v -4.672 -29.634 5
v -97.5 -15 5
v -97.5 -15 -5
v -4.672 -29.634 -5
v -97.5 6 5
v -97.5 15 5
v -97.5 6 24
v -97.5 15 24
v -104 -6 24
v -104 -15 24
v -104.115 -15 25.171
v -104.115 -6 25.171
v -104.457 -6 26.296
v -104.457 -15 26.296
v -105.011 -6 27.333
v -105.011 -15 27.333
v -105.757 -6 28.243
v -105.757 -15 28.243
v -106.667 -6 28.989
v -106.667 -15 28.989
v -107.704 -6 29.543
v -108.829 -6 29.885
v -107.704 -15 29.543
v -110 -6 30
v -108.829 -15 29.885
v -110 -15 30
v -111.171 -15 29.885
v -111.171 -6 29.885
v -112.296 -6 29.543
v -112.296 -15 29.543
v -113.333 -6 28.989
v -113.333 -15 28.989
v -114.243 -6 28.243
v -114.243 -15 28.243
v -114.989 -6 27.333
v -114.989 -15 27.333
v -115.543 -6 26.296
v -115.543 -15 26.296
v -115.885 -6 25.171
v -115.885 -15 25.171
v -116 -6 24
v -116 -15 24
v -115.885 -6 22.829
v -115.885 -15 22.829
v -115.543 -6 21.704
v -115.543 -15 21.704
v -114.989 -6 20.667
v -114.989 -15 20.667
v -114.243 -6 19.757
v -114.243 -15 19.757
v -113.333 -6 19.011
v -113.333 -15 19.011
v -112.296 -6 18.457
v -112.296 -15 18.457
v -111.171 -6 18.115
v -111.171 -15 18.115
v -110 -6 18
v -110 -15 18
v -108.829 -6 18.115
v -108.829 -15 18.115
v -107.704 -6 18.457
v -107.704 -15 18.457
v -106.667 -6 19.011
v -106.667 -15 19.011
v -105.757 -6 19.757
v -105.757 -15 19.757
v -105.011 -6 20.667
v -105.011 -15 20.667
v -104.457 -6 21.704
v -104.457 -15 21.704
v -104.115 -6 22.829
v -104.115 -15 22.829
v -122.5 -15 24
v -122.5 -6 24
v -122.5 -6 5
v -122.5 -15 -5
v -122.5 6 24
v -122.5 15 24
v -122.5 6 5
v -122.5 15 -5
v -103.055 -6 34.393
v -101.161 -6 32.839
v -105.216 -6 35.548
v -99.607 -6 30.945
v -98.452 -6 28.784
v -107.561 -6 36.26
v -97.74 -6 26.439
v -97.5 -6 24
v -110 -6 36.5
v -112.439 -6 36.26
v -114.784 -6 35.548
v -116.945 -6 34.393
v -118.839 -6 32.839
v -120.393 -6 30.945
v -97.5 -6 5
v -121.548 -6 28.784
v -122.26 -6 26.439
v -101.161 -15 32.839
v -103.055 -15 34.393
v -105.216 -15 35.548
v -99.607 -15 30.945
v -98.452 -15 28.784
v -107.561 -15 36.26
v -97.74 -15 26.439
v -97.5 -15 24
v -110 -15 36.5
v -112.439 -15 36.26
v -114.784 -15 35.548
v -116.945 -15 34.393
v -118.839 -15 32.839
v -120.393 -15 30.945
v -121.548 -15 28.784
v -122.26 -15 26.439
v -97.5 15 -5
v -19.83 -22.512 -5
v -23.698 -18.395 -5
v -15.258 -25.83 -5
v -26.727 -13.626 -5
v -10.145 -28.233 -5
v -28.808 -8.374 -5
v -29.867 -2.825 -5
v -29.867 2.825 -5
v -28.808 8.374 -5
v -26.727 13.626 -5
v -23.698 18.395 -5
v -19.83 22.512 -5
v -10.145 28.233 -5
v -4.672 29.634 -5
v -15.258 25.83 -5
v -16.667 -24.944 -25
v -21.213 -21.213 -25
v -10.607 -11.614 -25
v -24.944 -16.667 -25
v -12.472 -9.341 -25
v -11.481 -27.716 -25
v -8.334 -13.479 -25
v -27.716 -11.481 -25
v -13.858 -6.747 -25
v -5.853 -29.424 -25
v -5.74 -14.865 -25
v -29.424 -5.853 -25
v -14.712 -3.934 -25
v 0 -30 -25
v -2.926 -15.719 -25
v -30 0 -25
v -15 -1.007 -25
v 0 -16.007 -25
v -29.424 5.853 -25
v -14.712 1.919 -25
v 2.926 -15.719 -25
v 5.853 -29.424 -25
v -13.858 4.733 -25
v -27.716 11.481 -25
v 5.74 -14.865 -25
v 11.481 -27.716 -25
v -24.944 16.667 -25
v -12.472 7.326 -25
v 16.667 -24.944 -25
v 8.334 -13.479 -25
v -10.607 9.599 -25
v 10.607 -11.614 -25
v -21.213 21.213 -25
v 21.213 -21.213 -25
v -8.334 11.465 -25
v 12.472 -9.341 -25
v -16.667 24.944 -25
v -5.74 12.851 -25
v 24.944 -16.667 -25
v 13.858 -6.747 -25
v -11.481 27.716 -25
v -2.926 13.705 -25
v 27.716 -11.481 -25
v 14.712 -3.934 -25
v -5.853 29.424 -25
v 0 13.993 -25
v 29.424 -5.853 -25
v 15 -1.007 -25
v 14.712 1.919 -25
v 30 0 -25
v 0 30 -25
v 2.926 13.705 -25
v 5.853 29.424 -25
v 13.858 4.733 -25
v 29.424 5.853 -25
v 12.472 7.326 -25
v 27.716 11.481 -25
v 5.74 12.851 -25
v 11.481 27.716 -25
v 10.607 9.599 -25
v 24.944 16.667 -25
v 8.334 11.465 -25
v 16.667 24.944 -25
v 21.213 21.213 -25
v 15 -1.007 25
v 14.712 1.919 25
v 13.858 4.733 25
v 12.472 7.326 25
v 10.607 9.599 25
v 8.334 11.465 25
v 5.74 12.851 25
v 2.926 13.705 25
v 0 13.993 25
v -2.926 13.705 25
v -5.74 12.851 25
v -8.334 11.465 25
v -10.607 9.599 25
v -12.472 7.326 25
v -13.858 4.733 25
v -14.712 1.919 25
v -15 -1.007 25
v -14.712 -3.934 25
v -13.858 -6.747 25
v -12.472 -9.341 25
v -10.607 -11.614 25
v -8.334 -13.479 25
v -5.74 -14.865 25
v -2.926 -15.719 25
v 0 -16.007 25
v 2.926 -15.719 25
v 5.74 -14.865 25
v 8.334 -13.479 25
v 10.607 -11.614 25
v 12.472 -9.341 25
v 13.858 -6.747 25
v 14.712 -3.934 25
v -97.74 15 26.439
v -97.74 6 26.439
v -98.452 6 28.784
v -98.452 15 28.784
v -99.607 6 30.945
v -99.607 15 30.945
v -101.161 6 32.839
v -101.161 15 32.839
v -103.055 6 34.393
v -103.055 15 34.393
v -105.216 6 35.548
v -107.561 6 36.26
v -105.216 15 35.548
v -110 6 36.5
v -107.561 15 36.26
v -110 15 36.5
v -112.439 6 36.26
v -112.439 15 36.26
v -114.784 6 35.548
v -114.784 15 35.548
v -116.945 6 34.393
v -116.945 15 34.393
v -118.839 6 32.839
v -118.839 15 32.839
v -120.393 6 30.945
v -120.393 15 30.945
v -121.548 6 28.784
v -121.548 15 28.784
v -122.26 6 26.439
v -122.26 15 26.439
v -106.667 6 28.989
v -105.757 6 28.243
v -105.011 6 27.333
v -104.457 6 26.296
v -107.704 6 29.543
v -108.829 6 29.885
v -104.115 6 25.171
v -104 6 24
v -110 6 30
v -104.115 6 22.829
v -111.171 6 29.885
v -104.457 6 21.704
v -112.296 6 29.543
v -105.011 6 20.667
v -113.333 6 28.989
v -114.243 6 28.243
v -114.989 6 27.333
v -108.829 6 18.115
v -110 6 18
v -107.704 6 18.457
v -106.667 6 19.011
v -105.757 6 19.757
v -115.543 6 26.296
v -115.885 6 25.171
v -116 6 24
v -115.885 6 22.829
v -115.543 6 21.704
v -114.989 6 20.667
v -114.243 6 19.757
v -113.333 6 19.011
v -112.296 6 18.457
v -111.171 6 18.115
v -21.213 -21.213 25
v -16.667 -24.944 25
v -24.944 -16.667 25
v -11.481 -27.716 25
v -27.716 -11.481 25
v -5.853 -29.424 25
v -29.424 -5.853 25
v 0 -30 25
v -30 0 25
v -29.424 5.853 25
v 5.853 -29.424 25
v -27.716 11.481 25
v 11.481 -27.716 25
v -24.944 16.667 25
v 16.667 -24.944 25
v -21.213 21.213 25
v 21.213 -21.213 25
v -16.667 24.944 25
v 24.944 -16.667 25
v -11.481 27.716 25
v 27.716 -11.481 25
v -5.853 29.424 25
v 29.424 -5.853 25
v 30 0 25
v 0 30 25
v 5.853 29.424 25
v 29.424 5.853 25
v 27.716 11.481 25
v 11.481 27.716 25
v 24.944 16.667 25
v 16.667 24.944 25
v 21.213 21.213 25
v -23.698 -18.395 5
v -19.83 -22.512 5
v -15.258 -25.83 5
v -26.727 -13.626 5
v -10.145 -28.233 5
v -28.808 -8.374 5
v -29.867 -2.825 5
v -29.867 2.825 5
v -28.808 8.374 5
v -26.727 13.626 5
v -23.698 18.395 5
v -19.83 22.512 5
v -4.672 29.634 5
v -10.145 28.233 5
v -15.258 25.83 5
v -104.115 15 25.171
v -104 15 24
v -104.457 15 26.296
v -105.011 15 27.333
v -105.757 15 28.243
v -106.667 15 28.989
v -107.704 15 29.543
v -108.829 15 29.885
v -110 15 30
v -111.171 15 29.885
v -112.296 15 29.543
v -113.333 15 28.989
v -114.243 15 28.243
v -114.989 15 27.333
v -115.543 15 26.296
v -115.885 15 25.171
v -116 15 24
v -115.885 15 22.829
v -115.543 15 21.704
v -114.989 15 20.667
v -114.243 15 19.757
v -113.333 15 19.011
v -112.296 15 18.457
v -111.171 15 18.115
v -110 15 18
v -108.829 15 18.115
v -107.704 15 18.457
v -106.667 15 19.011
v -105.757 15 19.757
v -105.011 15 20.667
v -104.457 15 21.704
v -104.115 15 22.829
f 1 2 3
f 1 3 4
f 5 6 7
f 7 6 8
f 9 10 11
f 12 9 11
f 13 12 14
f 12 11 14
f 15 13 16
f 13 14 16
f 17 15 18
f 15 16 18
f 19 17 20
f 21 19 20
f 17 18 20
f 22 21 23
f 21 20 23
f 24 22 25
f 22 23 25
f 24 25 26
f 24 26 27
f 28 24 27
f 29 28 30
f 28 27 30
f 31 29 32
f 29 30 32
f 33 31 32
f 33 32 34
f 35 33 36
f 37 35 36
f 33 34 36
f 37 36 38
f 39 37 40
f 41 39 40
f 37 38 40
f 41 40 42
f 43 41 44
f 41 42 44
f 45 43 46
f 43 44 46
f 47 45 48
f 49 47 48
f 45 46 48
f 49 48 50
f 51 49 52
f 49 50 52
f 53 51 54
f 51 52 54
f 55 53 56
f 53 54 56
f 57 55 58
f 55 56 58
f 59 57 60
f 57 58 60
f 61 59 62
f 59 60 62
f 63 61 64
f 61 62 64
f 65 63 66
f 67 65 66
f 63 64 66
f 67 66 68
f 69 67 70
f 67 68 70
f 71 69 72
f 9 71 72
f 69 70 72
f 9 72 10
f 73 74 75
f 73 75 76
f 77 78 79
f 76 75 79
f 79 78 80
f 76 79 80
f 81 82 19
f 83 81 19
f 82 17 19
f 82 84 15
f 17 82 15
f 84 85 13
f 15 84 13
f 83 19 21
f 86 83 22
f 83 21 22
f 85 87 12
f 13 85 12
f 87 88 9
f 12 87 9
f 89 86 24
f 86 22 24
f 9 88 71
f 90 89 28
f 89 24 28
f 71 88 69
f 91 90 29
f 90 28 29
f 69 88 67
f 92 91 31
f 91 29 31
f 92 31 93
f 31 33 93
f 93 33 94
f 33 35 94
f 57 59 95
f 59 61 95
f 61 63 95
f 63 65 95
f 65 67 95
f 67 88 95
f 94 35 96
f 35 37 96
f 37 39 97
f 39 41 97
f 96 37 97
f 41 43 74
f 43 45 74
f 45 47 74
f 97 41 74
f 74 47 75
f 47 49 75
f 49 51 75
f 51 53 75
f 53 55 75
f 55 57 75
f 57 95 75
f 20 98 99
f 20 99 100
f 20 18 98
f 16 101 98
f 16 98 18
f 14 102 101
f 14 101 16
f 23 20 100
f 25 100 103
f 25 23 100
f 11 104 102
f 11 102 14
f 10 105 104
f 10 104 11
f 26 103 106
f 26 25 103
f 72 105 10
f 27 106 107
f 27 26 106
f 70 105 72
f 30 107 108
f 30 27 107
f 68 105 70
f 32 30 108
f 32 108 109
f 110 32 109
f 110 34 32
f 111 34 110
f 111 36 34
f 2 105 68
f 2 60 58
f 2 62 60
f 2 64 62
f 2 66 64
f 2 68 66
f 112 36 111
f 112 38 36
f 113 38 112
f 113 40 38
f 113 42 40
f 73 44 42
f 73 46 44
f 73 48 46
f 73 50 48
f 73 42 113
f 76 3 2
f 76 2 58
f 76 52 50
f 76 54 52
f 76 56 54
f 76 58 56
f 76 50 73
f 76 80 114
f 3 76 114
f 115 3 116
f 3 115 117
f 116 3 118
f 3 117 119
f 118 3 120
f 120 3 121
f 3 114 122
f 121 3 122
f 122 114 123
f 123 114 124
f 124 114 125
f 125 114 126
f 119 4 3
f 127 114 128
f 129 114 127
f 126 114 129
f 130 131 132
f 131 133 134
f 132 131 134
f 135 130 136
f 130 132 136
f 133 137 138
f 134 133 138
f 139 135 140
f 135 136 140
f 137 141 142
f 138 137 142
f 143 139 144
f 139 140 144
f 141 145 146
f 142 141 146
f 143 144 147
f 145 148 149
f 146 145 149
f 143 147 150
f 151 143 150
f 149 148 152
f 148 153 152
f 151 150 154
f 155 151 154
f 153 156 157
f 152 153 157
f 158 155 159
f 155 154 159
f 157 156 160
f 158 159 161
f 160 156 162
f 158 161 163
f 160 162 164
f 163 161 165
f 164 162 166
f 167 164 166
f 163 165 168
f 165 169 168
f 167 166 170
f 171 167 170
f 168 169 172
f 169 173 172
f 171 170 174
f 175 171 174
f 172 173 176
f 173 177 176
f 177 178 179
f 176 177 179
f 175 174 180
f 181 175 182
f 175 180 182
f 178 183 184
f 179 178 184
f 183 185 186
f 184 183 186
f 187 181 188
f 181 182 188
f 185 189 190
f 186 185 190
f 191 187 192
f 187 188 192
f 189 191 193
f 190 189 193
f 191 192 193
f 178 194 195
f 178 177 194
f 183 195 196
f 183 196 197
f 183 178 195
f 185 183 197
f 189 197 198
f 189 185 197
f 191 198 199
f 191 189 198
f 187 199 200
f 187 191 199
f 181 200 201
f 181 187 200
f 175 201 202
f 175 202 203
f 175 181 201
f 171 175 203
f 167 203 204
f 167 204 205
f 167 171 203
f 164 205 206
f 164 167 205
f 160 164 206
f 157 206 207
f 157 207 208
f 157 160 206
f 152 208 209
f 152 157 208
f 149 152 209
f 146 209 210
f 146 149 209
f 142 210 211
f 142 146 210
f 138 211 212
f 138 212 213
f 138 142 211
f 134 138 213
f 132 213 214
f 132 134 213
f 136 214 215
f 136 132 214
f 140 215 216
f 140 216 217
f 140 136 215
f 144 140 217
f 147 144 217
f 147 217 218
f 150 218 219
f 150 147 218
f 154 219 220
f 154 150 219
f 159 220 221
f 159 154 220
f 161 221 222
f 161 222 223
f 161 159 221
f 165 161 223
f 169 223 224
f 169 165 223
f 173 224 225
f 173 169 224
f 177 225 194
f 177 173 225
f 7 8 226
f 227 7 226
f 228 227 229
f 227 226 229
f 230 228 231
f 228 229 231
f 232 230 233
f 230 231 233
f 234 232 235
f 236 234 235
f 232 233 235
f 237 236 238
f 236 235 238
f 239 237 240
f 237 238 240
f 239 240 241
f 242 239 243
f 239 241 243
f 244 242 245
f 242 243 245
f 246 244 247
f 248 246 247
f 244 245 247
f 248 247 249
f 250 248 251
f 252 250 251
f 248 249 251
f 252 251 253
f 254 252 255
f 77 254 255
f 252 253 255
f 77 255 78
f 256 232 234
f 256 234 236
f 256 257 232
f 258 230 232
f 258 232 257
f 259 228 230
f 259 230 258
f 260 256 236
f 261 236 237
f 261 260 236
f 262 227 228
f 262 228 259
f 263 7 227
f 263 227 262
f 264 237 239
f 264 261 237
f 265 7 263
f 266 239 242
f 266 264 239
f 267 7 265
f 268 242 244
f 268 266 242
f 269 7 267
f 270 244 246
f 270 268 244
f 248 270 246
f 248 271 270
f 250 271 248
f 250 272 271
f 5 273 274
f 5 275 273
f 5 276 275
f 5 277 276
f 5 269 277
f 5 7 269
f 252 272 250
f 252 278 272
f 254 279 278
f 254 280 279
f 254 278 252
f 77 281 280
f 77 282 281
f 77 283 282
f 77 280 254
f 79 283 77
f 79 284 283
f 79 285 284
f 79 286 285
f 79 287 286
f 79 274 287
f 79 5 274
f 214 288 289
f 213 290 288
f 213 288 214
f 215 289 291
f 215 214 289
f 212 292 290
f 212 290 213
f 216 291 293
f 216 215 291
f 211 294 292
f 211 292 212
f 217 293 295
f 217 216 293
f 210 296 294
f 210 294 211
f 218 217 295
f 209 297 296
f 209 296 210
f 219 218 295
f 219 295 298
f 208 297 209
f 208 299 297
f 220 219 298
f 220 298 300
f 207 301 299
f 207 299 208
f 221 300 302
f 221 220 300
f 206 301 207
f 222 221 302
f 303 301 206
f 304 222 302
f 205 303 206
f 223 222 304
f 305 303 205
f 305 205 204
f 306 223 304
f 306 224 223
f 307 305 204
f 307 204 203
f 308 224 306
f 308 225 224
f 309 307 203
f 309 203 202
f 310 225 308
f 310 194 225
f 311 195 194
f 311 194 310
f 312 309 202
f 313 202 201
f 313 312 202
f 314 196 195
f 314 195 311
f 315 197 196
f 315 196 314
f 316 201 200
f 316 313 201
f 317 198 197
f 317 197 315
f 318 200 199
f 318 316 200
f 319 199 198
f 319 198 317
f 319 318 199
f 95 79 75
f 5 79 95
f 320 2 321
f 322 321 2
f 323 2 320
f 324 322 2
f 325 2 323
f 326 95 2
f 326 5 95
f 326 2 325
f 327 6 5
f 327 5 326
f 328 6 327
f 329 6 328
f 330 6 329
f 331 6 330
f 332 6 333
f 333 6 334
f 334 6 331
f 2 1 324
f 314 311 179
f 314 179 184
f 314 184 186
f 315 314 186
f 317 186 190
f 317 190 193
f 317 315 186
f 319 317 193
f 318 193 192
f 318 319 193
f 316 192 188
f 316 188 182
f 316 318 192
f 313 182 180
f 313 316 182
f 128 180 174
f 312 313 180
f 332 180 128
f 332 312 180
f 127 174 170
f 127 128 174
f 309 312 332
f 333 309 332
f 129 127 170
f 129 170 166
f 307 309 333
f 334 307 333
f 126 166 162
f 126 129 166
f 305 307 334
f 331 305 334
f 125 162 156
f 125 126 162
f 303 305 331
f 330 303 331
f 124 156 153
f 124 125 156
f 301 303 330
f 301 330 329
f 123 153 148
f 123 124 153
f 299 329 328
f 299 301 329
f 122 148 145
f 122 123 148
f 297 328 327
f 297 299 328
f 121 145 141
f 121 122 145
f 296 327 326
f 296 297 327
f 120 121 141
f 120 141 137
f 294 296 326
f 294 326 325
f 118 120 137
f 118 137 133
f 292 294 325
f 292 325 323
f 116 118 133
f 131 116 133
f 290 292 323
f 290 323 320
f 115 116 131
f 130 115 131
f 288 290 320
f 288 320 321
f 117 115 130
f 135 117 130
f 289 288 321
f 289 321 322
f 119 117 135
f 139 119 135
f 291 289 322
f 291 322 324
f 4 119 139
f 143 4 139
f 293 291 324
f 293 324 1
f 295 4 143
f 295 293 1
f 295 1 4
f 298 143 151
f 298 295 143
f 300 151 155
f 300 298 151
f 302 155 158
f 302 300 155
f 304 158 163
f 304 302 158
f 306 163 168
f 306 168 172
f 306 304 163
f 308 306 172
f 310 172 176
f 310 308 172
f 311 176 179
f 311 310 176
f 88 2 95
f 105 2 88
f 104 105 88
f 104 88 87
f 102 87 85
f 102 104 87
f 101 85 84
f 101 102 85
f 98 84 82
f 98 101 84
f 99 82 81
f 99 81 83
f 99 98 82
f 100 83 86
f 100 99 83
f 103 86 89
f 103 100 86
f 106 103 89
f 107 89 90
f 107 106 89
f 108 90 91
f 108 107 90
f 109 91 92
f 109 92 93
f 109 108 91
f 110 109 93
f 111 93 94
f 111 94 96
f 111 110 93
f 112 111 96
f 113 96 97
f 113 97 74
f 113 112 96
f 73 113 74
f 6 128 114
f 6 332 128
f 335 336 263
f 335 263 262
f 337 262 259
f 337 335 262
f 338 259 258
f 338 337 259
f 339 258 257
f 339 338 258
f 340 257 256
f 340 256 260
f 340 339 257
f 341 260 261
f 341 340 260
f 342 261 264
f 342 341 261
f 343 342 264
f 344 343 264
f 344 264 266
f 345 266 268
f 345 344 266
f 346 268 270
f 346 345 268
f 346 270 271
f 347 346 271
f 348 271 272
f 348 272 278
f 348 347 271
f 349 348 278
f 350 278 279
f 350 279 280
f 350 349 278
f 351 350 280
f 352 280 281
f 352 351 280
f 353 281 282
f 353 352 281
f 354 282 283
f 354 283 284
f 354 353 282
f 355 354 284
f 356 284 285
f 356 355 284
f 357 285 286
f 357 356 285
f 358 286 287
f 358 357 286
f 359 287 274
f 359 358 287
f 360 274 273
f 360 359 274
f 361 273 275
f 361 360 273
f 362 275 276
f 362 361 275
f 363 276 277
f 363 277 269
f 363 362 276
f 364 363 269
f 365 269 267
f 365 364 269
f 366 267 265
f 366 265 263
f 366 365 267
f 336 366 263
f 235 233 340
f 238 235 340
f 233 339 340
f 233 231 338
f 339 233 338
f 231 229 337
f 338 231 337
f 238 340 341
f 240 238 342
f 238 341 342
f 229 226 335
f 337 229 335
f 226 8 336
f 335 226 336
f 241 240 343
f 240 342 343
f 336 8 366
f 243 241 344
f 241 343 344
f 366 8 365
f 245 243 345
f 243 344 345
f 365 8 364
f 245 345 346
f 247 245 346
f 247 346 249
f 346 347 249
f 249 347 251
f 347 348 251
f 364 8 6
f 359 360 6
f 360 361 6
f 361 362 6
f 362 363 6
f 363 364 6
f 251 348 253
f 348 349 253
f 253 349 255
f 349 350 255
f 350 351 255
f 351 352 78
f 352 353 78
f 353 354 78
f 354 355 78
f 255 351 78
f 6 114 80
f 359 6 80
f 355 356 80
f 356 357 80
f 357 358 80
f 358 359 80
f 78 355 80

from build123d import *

# Parameters (mm, degrees)
SKETCH1_R           = 30
SKETCH1_R_2         = 15
BOSS_EXTRUDE1_DEPTH = 25
BOSS_EXTRUDE3_DEPTH = 5
SKETCH4_R           = 6
BOSS_EXTRUDE4_DEPTH = 9


with BuildPart() as part:
    # Sketch1 → Boss-Extrude1 (new body, symmetric)
    with BuildSketch(Plane.XY):
        Circle(SKETCH1_R)
        with Locations((0, -1.007153664)):
            Circle(SKETCH1_R_2, mode=Mode.SUBTRACT)
    extrude(amount=BOSS_EXTRUDE1_DEPTH, both=True)

    # Sketch2 → Boss-Extrude3 (add, symmetric)
    with BuildSketch(Plane.XY):
        with BuildLine():
            Line((-122.5, 15), (-122.5, -15))
            Line((-122.5, -15), (-97.5, -15))
            Line((-97.5, -15), (-4.671688756, -29.634023084))
            ThreePointArc((-4.671688756, -29.634023084), (-30, 0), (-4.671688756, 29.634023084))
            Line((-4.671688756, 29.634023084), (-97.5, 15))
            Line((-97.5, 15), (-122.5, 15))
        make_face()
    extrude(amount=BOSS_EXTRUDE3_DEPTH, both=True)

    # Sketch4 → Boss-Extrude4 (add)
    with BuildSketch(Plane(origin=(0, -15, 0), x_dir=(-1, 0, 0), z_dir=(0, -1, 0))):
        with BuildLine():
            Line((122.5, -24), (122.5, -5))
            Line((122.5, -5), (97.5, -5))
            Line((97.5, -5), (97.5, -24))
            ThreePointArc((97.5, -24), (110, -36.5), (122.5, -24))
        make_face()
        with Locations(Location((110, -24, 0), (0, 0, 180))):  # turned: the seam where the file's is
            Circle(SKETCH4_R, mode=Mode.SUBTRACT)
    boss_extrude4 = extrude(amount=-BOSS_EXTRUDE4_DEPTH)

    # Mirror1: Boss-Extrude4 across plane
    add(boss_extrude4.mirror(Plane.ZX))


solid = part.part
